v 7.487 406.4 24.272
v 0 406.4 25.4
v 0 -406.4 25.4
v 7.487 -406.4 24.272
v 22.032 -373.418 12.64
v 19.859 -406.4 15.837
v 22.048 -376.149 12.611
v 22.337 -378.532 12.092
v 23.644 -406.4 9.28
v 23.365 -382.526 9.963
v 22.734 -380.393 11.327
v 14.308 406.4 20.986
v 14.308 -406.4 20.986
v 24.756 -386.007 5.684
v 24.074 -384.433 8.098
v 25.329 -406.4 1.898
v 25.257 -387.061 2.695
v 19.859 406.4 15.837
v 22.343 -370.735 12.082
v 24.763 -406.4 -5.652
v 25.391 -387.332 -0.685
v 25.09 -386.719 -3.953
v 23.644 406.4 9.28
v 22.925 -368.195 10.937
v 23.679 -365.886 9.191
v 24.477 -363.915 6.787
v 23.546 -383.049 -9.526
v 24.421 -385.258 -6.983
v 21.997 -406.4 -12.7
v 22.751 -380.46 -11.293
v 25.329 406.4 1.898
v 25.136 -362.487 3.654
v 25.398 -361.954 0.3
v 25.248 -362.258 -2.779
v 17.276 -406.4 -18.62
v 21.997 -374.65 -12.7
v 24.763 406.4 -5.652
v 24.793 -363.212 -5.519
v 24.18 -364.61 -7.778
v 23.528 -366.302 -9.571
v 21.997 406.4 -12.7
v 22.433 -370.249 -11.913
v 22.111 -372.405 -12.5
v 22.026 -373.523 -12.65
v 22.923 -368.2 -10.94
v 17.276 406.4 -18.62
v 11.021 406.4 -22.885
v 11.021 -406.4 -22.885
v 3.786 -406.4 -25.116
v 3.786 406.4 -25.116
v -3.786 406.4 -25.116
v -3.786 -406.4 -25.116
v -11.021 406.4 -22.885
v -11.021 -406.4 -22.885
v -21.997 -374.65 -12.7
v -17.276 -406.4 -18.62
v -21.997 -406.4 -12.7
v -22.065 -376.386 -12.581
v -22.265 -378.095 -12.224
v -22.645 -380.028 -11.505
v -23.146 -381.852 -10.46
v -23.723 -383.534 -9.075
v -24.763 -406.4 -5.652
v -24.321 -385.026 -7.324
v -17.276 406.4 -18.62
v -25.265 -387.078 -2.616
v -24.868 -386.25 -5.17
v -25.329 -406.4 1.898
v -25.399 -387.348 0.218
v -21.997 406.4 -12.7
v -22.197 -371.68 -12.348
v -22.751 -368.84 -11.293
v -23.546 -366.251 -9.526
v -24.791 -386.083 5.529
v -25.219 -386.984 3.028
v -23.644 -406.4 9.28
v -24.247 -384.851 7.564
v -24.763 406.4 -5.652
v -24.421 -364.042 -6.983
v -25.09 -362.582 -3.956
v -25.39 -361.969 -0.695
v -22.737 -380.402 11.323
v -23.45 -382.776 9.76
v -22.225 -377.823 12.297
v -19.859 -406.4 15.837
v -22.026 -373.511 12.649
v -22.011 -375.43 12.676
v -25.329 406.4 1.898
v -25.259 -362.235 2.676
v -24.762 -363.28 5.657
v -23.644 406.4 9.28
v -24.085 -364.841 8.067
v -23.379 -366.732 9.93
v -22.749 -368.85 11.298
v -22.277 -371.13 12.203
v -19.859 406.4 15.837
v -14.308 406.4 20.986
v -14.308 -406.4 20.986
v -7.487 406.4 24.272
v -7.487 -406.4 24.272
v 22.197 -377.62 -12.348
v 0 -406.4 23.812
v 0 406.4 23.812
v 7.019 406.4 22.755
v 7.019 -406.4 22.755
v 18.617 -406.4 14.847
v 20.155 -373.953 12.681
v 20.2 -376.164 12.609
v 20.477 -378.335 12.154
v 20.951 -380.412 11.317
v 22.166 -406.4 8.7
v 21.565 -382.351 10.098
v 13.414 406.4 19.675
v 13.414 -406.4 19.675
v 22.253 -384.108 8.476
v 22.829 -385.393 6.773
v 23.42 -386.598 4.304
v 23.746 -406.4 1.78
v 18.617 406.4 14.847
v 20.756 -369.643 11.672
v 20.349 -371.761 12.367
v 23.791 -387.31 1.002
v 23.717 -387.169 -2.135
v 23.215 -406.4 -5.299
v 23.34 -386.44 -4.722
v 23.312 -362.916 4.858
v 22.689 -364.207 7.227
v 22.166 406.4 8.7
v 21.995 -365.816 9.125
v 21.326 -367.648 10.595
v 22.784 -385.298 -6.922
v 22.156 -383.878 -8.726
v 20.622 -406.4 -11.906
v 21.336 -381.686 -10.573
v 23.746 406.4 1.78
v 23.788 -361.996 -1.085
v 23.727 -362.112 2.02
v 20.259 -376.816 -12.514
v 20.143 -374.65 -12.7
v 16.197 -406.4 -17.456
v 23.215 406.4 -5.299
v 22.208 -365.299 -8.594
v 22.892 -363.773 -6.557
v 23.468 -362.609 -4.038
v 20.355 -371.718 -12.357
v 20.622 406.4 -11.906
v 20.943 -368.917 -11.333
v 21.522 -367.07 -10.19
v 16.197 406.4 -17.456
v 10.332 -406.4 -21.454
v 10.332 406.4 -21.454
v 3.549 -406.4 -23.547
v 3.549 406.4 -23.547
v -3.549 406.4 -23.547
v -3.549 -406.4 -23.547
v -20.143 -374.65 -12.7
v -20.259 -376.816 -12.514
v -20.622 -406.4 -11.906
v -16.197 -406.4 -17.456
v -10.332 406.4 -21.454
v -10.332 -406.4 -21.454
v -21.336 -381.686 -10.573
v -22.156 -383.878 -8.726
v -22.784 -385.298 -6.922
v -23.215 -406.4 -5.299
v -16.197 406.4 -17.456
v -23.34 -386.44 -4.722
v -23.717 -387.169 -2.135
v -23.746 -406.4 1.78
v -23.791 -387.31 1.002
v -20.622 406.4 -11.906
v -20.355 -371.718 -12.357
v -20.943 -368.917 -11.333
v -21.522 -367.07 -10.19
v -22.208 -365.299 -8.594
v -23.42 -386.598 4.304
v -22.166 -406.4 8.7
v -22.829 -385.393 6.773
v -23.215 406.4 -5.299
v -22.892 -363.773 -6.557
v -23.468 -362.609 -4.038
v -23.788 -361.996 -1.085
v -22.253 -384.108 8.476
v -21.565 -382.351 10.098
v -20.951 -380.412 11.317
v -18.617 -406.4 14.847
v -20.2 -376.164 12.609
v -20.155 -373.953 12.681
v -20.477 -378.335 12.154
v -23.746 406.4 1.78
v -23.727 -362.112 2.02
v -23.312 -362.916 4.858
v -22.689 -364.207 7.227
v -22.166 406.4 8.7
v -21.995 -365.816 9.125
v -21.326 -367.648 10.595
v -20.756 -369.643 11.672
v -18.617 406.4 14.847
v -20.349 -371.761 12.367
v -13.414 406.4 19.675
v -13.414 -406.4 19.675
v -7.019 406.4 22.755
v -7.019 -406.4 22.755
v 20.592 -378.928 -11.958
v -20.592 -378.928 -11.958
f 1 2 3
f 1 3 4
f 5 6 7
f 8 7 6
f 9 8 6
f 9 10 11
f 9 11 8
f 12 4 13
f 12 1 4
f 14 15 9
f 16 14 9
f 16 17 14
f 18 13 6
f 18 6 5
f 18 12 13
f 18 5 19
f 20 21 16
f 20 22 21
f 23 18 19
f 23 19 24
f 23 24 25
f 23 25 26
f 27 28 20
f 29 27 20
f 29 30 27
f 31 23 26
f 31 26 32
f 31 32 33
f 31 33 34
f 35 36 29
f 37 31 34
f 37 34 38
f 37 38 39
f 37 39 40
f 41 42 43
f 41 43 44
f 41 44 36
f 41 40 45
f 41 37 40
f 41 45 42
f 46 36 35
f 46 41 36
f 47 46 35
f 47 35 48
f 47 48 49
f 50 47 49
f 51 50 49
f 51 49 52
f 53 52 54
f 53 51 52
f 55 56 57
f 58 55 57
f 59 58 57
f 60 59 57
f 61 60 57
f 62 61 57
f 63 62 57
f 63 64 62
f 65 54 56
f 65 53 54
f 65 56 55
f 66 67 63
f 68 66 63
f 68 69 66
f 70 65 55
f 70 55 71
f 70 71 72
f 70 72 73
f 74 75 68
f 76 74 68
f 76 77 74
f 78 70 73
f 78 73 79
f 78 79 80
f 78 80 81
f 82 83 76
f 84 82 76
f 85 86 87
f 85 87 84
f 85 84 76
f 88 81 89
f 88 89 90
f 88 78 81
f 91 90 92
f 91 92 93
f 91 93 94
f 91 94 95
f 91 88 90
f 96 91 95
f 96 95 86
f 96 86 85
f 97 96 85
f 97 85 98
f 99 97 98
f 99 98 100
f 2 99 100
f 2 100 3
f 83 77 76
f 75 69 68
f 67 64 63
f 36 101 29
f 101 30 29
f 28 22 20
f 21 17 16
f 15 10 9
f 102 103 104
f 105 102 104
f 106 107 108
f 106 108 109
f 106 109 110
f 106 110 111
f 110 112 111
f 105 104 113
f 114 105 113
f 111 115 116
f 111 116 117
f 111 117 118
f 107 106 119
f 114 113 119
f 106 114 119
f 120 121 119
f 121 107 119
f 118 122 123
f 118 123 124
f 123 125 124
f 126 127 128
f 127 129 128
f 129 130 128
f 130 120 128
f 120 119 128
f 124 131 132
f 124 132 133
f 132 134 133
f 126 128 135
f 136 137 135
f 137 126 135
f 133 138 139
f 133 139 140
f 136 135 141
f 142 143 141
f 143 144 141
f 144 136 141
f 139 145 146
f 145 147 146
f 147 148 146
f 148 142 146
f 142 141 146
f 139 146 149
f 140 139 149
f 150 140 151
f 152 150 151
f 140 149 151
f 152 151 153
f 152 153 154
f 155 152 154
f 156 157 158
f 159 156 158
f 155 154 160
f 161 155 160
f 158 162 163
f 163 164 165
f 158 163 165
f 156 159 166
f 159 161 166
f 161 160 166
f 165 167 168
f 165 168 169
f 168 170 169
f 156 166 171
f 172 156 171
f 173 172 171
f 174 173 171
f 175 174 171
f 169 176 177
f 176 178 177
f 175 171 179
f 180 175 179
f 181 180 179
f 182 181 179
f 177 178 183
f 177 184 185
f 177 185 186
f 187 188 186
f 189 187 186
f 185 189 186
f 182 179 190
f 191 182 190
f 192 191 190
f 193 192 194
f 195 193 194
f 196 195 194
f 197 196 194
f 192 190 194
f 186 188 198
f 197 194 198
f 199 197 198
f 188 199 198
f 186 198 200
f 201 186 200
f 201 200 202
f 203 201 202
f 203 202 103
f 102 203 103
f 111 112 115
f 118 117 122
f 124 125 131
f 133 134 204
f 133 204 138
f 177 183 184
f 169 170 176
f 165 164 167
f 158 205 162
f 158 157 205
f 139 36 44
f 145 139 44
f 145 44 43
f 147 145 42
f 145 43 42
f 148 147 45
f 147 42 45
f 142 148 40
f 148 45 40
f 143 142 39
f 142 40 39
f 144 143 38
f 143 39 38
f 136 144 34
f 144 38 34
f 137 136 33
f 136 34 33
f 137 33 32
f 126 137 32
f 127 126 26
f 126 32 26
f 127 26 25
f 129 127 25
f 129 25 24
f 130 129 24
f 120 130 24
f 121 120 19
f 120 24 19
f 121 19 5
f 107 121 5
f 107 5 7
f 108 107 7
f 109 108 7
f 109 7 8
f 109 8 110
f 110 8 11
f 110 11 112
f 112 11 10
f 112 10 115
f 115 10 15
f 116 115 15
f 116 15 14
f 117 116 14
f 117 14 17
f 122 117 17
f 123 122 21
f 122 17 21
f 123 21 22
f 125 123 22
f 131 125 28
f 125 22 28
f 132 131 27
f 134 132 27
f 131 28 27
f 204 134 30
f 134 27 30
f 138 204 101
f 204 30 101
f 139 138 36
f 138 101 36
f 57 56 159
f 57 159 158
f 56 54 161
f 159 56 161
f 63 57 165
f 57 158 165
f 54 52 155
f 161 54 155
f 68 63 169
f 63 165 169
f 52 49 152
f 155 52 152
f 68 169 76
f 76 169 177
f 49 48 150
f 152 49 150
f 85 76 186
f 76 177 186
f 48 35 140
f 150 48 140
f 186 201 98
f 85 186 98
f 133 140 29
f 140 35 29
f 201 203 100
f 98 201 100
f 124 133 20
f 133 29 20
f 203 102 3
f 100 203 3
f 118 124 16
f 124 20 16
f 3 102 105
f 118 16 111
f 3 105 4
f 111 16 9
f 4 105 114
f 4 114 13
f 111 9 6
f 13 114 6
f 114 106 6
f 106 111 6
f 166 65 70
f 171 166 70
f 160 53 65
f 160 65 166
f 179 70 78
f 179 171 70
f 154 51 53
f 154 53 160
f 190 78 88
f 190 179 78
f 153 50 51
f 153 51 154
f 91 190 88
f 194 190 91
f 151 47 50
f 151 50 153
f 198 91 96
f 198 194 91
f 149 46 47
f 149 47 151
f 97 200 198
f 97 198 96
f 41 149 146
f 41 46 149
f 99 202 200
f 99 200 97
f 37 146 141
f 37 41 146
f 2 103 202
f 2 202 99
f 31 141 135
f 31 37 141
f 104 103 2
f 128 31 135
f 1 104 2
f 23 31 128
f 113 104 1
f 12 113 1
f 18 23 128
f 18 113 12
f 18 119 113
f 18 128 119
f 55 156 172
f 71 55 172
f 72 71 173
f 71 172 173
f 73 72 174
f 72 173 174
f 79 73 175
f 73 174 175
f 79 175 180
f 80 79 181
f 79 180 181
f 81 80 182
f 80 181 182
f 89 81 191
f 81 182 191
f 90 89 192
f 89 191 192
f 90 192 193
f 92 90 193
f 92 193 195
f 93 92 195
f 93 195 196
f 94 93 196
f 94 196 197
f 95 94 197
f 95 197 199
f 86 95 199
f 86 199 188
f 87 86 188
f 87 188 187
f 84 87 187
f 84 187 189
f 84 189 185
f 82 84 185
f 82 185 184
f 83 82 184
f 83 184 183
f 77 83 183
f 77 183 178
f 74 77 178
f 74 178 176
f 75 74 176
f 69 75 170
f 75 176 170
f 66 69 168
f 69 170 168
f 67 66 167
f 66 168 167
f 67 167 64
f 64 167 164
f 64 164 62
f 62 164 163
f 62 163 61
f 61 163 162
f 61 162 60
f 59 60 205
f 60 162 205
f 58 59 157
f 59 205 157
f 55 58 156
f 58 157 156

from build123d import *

# Parameters (mm, degrees)
SKETCH1_R           = 25.4
BOSS_EXTRUDE1_DEPTH = 406.4
SHELL1_T            = -1.5875
SKETCH2_R           = 12.7
CUT_EXTRUDE1_DEPTH  = 411.349558304


with BuildPart() as part:
    # Sketch1 → Boss-Extrude1 (new, symmetric)
    with BuildSketch(Plane(origin=(0, 0, 0), x_dir=(1, 0, 0), z_dir=(0, 1, 0))):
        with Locations(Location((0, 0, 0), (0, 0, 270))):
            Circle(SKETCH1_R)
    extrude(amount=BOSS_EXTRUDE1_DEPTH, both=True)

    # Shell1
    shell1_openings = [part.faces().sort_by_distance(p)[0] for p in [
        (0, 406.4, 0),
        (0, -406.4, 0),
    ]]
    offset(amount=SHELL1_T, openings=shell1_openings, kind=Kind.INTERSECTION)

    # Sketch2 → Cut-Extrude1 (cut, through all)
    with BuildSketch(Plane(origin=(25.4, 0, 0), x_dir=(0, 0, -1), z_dir=(1, 0, 0))):
        with Locations((0, -374.65)):
            Circle(SKETCH2_R)
    extrude(amount=-CUT_EXTRUDE1_DEPTH, mode=Mode.SUBTRACT)


solid = part.part
